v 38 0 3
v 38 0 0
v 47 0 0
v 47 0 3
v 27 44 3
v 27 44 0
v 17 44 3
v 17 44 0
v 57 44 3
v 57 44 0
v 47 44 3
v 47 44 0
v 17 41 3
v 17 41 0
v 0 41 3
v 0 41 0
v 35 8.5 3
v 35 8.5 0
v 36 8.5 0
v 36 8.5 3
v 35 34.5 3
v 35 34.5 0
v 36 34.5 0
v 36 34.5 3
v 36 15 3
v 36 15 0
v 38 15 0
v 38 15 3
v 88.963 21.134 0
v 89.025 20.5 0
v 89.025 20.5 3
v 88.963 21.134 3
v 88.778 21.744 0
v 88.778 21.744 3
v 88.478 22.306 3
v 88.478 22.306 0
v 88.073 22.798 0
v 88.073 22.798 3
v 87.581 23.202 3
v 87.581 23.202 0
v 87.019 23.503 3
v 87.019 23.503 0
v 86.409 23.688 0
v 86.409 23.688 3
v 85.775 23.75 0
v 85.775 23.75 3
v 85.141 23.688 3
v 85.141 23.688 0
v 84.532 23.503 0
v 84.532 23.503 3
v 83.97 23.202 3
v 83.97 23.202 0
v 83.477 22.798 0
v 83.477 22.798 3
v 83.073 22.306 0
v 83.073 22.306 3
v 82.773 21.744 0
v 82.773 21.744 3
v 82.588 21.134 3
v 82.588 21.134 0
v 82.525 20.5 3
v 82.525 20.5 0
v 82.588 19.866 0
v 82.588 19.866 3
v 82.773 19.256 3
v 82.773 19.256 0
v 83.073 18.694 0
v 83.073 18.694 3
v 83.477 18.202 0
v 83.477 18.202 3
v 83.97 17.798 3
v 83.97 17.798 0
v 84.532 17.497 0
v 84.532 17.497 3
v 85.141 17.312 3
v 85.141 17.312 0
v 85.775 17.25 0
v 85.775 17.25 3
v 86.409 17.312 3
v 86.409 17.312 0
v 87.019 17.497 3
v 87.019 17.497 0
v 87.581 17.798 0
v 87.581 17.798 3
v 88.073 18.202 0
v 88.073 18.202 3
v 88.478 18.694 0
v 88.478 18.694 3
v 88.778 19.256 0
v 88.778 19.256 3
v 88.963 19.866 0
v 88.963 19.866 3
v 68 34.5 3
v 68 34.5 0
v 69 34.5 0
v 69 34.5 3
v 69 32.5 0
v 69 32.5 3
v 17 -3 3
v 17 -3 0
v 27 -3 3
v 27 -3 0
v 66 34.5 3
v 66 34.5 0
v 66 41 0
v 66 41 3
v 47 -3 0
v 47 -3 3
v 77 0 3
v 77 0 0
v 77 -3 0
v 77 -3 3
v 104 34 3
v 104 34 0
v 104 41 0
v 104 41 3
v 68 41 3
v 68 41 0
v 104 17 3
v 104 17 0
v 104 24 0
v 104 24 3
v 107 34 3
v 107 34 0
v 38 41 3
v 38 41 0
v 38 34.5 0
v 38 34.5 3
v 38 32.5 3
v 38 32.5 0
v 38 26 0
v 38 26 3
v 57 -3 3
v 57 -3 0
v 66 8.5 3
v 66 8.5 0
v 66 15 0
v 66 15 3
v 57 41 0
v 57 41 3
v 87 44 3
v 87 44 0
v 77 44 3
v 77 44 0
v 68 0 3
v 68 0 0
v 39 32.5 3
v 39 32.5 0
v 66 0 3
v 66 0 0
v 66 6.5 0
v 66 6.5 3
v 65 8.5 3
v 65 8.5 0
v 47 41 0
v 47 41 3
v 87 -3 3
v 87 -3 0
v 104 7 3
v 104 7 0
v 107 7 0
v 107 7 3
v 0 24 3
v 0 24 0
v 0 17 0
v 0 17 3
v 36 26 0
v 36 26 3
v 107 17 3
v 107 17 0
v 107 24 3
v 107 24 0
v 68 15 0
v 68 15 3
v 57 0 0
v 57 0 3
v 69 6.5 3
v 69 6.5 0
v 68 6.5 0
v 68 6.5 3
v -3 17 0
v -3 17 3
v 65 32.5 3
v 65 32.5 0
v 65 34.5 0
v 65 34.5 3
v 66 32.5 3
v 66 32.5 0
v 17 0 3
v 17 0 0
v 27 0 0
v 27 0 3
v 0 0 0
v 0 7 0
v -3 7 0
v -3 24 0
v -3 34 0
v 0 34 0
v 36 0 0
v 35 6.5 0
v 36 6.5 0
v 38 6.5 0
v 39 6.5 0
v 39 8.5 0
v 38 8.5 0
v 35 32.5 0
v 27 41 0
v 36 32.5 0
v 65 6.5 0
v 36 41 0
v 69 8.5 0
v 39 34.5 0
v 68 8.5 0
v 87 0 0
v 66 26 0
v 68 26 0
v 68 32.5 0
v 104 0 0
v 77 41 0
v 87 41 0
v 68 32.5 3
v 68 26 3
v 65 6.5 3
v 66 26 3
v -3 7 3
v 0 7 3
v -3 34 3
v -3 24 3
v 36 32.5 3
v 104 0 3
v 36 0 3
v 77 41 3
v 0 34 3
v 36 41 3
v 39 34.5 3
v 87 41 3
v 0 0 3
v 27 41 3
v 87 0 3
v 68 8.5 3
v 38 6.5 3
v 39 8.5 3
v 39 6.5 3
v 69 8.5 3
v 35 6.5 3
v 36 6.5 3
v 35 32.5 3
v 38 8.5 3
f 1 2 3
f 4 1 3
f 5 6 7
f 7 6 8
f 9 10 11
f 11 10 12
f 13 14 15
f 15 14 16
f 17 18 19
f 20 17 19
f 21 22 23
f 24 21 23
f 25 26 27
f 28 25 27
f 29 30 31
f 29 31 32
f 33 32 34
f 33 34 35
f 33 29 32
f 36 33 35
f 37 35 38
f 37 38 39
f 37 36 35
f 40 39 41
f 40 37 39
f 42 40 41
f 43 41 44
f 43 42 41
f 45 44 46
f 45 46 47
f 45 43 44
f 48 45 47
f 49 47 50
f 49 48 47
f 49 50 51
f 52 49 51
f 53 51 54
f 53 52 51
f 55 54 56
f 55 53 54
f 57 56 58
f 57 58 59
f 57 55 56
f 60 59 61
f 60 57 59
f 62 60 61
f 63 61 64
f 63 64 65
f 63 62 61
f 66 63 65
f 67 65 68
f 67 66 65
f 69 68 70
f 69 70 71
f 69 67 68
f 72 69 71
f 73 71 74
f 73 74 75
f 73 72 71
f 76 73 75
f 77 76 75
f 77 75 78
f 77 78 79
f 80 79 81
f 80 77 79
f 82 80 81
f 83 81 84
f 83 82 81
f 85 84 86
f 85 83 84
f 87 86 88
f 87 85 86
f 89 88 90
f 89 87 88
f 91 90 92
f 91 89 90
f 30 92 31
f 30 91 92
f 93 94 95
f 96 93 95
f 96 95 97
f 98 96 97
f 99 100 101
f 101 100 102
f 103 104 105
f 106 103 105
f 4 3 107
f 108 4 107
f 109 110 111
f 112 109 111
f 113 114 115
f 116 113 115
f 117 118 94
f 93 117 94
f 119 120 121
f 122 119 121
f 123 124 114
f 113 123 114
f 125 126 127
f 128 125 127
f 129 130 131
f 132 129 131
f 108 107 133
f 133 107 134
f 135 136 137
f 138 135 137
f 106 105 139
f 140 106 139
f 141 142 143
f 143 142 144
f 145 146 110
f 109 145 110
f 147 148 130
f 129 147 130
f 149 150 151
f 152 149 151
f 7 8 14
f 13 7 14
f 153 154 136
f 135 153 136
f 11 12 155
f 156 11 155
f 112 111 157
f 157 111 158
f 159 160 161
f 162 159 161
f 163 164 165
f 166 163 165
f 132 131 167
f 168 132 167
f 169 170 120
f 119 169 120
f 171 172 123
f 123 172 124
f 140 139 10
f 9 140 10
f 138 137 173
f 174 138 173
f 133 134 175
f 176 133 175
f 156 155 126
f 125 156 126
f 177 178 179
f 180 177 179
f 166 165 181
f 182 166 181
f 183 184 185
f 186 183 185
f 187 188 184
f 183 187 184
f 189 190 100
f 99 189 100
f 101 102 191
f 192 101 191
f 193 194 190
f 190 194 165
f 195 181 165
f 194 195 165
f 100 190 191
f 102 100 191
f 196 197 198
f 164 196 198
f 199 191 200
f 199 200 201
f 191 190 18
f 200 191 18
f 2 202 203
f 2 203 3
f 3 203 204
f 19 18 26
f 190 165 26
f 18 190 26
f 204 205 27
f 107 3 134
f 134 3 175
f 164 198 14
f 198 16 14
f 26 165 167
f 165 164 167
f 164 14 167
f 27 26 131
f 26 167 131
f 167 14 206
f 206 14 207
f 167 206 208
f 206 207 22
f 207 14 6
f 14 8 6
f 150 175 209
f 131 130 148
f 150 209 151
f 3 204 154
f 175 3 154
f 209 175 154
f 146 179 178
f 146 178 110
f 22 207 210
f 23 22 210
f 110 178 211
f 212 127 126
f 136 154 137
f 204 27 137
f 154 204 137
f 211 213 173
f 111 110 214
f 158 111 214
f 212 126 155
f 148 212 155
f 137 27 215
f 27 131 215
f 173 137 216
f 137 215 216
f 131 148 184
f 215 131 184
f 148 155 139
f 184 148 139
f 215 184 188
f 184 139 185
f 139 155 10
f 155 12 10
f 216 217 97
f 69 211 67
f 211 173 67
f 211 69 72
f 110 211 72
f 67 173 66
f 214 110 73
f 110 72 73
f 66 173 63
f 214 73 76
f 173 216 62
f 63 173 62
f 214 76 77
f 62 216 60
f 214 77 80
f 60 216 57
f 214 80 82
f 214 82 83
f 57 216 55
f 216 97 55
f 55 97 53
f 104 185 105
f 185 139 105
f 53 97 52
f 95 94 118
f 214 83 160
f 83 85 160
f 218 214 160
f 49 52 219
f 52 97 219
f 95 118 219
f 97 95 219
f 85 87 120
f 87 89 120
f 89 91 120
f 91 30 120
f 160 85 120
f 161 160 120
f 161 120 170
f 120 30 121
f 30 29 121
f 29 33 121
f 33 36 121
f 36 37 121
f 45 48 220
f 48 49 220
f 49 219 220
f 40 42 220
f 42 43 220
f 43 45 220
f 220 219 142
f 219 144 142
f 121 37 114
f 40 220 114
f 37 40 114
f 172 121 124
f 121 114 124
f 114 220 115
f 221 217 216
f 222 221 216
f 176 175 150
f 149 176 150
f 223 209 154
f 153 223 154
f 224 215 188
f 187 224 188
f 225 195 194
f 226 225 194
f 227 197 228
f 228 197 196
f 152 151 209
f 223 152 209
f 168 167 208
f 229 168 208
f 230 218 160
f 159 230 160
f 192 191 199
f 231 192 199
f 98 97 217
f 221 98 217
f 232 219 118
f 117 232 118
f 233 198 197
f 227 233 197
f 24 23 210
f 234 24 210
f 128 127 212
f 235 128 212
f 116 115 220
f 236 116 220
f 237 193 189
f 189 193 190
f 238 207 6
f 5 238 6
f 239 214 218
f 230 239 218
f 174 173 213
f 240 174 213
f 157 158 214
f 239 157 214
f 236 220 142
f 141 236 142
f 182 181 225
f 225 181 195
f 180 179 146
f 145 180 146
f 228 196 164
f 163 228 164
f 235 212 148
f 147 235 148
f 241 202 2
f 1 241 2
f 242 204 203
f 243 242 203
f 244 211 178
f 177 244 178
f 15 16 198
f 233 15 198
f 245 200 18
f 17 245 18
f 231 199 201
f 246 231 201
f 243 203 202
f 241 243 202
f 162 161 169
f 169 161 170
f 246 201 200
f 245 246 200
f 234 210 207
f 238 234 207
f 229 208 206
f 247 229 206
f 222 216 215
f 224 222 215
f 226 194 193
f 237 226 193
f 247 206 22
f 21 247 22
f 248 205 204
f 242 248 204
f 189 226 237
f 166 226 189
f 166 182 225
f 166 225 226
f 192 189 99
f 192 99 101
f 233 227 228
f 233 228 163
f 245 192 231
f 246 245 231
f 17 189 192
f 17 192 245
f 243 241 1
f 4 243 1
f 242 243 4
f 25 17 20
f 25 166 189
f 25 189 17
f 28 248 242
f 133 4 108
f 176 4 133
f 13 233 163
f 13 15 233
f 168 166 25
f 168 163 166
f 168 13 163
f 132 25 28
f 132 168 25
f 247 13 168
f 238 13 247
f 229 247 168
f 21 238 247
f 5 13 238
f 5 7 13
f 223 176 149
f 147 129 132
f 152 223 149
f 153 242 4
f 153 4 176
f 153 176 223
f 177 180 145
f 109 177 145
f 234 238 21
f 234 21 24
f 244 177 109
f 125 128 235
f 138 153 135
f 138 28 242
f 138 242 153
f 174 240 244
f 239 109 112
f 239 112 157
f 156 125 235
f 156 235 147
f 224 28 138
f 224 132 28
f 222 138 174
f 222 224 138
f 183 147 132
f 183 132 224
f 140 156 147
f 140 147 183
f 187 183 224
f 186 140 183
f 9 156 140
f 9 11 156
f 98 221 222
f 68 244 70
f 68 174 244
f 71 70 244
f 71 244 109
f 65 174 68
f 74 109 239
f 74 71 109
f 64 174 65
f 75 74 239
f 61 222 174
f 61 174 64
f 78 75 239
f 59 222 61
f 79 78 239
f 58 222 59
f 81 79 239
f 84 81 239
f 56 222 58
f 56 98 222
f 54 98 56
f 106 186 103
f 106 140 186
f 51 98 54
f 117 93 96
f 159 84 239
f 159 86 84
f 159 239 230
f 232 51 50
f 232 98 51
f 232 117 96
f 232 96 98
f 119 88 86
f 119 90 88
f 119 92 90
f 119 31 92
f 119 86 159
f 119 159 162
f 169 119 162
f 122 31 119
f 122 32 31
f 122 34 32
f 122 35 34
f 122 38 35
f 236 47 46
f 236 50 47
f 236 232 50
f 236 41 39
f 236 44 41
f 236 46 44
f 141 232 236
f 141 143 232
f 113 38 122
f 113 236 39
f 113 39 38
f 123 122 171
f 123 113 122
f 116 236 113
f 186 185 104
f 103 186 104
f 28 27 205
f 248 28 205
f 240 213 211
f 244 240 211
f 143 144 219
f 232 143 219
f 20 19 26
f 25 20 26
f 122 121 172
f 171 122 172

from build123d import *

# Parameters (mm, degrees)
F0_R     = 3.25
F1_DEPTH = 3


# Not quite as in the source:
# - a feature names something its author has since deleted; it is built from what else it names


with BuildPart() as f1:
    # F0 (on Top) → F1 (new body)
    with BuildSketch(Plane.XY):
        Polygon((0, 7), (0, 0), (17, 0), (17, -3), (27, -3), (27, 0), (36, 0), (36, 6.5), (35, 6.5), (35, 8.5), (36, 8.5), (36, 15), (38, 15), (38, 8.5), (39, 8.5), (39, 6.5), (38, 6.5), (38, 0), (47, 0), (47, -3), (57, -3), (57, 0), (66, 0), (66, 6.5), (65, 6.5), (65, 8.5), (66, 8.5), (66, 15), (68, 15), (68, 8.5), (69, 8.5), (69, 6.5), (68, 6.5), (68, 0), (77, 0), (77, -3), (87, -3), (87, 0), (104, 0), (104, 7), (107, 7), (107, 17), (104, 17), (104, 24), (107, 24), (107, 34), (104, 34), (104, 41), (87, 41), (87, 44), (77, 44), (77, 41), (68, 41), (68, 34.5), (69, 34.5), (69, 32.5), (68, 32.5), (68, 26), (66, 26), (66, 32.5), (65, 32.5), (65, 34.5), (66, 34.5), (66, 41), (57, 41), (57, 44), (47, 44), (47, 41), (38, 41), (38, 34.5), (39, 34.5), (39, 32.5), (38, 32.5), (38, 26), (36, 26), (36, 32.5), (35, 32.5), (35, 34.5), (36, 34.5), (36, 41), (27, 41), (27, 44), (17, 44), (17, 41), (0, 41), (0, 34), (-3, 34), (-3, 24), (0, 24), (0, 17), (-3, 17), (-3, 7), align=None)
        with Locations((85.7752785087, 20.5)):
            Circle(F0_R, mode=Mode.SUBTRACT)
    extrude(amount=F1_DEPTH)


solid = f1.part
